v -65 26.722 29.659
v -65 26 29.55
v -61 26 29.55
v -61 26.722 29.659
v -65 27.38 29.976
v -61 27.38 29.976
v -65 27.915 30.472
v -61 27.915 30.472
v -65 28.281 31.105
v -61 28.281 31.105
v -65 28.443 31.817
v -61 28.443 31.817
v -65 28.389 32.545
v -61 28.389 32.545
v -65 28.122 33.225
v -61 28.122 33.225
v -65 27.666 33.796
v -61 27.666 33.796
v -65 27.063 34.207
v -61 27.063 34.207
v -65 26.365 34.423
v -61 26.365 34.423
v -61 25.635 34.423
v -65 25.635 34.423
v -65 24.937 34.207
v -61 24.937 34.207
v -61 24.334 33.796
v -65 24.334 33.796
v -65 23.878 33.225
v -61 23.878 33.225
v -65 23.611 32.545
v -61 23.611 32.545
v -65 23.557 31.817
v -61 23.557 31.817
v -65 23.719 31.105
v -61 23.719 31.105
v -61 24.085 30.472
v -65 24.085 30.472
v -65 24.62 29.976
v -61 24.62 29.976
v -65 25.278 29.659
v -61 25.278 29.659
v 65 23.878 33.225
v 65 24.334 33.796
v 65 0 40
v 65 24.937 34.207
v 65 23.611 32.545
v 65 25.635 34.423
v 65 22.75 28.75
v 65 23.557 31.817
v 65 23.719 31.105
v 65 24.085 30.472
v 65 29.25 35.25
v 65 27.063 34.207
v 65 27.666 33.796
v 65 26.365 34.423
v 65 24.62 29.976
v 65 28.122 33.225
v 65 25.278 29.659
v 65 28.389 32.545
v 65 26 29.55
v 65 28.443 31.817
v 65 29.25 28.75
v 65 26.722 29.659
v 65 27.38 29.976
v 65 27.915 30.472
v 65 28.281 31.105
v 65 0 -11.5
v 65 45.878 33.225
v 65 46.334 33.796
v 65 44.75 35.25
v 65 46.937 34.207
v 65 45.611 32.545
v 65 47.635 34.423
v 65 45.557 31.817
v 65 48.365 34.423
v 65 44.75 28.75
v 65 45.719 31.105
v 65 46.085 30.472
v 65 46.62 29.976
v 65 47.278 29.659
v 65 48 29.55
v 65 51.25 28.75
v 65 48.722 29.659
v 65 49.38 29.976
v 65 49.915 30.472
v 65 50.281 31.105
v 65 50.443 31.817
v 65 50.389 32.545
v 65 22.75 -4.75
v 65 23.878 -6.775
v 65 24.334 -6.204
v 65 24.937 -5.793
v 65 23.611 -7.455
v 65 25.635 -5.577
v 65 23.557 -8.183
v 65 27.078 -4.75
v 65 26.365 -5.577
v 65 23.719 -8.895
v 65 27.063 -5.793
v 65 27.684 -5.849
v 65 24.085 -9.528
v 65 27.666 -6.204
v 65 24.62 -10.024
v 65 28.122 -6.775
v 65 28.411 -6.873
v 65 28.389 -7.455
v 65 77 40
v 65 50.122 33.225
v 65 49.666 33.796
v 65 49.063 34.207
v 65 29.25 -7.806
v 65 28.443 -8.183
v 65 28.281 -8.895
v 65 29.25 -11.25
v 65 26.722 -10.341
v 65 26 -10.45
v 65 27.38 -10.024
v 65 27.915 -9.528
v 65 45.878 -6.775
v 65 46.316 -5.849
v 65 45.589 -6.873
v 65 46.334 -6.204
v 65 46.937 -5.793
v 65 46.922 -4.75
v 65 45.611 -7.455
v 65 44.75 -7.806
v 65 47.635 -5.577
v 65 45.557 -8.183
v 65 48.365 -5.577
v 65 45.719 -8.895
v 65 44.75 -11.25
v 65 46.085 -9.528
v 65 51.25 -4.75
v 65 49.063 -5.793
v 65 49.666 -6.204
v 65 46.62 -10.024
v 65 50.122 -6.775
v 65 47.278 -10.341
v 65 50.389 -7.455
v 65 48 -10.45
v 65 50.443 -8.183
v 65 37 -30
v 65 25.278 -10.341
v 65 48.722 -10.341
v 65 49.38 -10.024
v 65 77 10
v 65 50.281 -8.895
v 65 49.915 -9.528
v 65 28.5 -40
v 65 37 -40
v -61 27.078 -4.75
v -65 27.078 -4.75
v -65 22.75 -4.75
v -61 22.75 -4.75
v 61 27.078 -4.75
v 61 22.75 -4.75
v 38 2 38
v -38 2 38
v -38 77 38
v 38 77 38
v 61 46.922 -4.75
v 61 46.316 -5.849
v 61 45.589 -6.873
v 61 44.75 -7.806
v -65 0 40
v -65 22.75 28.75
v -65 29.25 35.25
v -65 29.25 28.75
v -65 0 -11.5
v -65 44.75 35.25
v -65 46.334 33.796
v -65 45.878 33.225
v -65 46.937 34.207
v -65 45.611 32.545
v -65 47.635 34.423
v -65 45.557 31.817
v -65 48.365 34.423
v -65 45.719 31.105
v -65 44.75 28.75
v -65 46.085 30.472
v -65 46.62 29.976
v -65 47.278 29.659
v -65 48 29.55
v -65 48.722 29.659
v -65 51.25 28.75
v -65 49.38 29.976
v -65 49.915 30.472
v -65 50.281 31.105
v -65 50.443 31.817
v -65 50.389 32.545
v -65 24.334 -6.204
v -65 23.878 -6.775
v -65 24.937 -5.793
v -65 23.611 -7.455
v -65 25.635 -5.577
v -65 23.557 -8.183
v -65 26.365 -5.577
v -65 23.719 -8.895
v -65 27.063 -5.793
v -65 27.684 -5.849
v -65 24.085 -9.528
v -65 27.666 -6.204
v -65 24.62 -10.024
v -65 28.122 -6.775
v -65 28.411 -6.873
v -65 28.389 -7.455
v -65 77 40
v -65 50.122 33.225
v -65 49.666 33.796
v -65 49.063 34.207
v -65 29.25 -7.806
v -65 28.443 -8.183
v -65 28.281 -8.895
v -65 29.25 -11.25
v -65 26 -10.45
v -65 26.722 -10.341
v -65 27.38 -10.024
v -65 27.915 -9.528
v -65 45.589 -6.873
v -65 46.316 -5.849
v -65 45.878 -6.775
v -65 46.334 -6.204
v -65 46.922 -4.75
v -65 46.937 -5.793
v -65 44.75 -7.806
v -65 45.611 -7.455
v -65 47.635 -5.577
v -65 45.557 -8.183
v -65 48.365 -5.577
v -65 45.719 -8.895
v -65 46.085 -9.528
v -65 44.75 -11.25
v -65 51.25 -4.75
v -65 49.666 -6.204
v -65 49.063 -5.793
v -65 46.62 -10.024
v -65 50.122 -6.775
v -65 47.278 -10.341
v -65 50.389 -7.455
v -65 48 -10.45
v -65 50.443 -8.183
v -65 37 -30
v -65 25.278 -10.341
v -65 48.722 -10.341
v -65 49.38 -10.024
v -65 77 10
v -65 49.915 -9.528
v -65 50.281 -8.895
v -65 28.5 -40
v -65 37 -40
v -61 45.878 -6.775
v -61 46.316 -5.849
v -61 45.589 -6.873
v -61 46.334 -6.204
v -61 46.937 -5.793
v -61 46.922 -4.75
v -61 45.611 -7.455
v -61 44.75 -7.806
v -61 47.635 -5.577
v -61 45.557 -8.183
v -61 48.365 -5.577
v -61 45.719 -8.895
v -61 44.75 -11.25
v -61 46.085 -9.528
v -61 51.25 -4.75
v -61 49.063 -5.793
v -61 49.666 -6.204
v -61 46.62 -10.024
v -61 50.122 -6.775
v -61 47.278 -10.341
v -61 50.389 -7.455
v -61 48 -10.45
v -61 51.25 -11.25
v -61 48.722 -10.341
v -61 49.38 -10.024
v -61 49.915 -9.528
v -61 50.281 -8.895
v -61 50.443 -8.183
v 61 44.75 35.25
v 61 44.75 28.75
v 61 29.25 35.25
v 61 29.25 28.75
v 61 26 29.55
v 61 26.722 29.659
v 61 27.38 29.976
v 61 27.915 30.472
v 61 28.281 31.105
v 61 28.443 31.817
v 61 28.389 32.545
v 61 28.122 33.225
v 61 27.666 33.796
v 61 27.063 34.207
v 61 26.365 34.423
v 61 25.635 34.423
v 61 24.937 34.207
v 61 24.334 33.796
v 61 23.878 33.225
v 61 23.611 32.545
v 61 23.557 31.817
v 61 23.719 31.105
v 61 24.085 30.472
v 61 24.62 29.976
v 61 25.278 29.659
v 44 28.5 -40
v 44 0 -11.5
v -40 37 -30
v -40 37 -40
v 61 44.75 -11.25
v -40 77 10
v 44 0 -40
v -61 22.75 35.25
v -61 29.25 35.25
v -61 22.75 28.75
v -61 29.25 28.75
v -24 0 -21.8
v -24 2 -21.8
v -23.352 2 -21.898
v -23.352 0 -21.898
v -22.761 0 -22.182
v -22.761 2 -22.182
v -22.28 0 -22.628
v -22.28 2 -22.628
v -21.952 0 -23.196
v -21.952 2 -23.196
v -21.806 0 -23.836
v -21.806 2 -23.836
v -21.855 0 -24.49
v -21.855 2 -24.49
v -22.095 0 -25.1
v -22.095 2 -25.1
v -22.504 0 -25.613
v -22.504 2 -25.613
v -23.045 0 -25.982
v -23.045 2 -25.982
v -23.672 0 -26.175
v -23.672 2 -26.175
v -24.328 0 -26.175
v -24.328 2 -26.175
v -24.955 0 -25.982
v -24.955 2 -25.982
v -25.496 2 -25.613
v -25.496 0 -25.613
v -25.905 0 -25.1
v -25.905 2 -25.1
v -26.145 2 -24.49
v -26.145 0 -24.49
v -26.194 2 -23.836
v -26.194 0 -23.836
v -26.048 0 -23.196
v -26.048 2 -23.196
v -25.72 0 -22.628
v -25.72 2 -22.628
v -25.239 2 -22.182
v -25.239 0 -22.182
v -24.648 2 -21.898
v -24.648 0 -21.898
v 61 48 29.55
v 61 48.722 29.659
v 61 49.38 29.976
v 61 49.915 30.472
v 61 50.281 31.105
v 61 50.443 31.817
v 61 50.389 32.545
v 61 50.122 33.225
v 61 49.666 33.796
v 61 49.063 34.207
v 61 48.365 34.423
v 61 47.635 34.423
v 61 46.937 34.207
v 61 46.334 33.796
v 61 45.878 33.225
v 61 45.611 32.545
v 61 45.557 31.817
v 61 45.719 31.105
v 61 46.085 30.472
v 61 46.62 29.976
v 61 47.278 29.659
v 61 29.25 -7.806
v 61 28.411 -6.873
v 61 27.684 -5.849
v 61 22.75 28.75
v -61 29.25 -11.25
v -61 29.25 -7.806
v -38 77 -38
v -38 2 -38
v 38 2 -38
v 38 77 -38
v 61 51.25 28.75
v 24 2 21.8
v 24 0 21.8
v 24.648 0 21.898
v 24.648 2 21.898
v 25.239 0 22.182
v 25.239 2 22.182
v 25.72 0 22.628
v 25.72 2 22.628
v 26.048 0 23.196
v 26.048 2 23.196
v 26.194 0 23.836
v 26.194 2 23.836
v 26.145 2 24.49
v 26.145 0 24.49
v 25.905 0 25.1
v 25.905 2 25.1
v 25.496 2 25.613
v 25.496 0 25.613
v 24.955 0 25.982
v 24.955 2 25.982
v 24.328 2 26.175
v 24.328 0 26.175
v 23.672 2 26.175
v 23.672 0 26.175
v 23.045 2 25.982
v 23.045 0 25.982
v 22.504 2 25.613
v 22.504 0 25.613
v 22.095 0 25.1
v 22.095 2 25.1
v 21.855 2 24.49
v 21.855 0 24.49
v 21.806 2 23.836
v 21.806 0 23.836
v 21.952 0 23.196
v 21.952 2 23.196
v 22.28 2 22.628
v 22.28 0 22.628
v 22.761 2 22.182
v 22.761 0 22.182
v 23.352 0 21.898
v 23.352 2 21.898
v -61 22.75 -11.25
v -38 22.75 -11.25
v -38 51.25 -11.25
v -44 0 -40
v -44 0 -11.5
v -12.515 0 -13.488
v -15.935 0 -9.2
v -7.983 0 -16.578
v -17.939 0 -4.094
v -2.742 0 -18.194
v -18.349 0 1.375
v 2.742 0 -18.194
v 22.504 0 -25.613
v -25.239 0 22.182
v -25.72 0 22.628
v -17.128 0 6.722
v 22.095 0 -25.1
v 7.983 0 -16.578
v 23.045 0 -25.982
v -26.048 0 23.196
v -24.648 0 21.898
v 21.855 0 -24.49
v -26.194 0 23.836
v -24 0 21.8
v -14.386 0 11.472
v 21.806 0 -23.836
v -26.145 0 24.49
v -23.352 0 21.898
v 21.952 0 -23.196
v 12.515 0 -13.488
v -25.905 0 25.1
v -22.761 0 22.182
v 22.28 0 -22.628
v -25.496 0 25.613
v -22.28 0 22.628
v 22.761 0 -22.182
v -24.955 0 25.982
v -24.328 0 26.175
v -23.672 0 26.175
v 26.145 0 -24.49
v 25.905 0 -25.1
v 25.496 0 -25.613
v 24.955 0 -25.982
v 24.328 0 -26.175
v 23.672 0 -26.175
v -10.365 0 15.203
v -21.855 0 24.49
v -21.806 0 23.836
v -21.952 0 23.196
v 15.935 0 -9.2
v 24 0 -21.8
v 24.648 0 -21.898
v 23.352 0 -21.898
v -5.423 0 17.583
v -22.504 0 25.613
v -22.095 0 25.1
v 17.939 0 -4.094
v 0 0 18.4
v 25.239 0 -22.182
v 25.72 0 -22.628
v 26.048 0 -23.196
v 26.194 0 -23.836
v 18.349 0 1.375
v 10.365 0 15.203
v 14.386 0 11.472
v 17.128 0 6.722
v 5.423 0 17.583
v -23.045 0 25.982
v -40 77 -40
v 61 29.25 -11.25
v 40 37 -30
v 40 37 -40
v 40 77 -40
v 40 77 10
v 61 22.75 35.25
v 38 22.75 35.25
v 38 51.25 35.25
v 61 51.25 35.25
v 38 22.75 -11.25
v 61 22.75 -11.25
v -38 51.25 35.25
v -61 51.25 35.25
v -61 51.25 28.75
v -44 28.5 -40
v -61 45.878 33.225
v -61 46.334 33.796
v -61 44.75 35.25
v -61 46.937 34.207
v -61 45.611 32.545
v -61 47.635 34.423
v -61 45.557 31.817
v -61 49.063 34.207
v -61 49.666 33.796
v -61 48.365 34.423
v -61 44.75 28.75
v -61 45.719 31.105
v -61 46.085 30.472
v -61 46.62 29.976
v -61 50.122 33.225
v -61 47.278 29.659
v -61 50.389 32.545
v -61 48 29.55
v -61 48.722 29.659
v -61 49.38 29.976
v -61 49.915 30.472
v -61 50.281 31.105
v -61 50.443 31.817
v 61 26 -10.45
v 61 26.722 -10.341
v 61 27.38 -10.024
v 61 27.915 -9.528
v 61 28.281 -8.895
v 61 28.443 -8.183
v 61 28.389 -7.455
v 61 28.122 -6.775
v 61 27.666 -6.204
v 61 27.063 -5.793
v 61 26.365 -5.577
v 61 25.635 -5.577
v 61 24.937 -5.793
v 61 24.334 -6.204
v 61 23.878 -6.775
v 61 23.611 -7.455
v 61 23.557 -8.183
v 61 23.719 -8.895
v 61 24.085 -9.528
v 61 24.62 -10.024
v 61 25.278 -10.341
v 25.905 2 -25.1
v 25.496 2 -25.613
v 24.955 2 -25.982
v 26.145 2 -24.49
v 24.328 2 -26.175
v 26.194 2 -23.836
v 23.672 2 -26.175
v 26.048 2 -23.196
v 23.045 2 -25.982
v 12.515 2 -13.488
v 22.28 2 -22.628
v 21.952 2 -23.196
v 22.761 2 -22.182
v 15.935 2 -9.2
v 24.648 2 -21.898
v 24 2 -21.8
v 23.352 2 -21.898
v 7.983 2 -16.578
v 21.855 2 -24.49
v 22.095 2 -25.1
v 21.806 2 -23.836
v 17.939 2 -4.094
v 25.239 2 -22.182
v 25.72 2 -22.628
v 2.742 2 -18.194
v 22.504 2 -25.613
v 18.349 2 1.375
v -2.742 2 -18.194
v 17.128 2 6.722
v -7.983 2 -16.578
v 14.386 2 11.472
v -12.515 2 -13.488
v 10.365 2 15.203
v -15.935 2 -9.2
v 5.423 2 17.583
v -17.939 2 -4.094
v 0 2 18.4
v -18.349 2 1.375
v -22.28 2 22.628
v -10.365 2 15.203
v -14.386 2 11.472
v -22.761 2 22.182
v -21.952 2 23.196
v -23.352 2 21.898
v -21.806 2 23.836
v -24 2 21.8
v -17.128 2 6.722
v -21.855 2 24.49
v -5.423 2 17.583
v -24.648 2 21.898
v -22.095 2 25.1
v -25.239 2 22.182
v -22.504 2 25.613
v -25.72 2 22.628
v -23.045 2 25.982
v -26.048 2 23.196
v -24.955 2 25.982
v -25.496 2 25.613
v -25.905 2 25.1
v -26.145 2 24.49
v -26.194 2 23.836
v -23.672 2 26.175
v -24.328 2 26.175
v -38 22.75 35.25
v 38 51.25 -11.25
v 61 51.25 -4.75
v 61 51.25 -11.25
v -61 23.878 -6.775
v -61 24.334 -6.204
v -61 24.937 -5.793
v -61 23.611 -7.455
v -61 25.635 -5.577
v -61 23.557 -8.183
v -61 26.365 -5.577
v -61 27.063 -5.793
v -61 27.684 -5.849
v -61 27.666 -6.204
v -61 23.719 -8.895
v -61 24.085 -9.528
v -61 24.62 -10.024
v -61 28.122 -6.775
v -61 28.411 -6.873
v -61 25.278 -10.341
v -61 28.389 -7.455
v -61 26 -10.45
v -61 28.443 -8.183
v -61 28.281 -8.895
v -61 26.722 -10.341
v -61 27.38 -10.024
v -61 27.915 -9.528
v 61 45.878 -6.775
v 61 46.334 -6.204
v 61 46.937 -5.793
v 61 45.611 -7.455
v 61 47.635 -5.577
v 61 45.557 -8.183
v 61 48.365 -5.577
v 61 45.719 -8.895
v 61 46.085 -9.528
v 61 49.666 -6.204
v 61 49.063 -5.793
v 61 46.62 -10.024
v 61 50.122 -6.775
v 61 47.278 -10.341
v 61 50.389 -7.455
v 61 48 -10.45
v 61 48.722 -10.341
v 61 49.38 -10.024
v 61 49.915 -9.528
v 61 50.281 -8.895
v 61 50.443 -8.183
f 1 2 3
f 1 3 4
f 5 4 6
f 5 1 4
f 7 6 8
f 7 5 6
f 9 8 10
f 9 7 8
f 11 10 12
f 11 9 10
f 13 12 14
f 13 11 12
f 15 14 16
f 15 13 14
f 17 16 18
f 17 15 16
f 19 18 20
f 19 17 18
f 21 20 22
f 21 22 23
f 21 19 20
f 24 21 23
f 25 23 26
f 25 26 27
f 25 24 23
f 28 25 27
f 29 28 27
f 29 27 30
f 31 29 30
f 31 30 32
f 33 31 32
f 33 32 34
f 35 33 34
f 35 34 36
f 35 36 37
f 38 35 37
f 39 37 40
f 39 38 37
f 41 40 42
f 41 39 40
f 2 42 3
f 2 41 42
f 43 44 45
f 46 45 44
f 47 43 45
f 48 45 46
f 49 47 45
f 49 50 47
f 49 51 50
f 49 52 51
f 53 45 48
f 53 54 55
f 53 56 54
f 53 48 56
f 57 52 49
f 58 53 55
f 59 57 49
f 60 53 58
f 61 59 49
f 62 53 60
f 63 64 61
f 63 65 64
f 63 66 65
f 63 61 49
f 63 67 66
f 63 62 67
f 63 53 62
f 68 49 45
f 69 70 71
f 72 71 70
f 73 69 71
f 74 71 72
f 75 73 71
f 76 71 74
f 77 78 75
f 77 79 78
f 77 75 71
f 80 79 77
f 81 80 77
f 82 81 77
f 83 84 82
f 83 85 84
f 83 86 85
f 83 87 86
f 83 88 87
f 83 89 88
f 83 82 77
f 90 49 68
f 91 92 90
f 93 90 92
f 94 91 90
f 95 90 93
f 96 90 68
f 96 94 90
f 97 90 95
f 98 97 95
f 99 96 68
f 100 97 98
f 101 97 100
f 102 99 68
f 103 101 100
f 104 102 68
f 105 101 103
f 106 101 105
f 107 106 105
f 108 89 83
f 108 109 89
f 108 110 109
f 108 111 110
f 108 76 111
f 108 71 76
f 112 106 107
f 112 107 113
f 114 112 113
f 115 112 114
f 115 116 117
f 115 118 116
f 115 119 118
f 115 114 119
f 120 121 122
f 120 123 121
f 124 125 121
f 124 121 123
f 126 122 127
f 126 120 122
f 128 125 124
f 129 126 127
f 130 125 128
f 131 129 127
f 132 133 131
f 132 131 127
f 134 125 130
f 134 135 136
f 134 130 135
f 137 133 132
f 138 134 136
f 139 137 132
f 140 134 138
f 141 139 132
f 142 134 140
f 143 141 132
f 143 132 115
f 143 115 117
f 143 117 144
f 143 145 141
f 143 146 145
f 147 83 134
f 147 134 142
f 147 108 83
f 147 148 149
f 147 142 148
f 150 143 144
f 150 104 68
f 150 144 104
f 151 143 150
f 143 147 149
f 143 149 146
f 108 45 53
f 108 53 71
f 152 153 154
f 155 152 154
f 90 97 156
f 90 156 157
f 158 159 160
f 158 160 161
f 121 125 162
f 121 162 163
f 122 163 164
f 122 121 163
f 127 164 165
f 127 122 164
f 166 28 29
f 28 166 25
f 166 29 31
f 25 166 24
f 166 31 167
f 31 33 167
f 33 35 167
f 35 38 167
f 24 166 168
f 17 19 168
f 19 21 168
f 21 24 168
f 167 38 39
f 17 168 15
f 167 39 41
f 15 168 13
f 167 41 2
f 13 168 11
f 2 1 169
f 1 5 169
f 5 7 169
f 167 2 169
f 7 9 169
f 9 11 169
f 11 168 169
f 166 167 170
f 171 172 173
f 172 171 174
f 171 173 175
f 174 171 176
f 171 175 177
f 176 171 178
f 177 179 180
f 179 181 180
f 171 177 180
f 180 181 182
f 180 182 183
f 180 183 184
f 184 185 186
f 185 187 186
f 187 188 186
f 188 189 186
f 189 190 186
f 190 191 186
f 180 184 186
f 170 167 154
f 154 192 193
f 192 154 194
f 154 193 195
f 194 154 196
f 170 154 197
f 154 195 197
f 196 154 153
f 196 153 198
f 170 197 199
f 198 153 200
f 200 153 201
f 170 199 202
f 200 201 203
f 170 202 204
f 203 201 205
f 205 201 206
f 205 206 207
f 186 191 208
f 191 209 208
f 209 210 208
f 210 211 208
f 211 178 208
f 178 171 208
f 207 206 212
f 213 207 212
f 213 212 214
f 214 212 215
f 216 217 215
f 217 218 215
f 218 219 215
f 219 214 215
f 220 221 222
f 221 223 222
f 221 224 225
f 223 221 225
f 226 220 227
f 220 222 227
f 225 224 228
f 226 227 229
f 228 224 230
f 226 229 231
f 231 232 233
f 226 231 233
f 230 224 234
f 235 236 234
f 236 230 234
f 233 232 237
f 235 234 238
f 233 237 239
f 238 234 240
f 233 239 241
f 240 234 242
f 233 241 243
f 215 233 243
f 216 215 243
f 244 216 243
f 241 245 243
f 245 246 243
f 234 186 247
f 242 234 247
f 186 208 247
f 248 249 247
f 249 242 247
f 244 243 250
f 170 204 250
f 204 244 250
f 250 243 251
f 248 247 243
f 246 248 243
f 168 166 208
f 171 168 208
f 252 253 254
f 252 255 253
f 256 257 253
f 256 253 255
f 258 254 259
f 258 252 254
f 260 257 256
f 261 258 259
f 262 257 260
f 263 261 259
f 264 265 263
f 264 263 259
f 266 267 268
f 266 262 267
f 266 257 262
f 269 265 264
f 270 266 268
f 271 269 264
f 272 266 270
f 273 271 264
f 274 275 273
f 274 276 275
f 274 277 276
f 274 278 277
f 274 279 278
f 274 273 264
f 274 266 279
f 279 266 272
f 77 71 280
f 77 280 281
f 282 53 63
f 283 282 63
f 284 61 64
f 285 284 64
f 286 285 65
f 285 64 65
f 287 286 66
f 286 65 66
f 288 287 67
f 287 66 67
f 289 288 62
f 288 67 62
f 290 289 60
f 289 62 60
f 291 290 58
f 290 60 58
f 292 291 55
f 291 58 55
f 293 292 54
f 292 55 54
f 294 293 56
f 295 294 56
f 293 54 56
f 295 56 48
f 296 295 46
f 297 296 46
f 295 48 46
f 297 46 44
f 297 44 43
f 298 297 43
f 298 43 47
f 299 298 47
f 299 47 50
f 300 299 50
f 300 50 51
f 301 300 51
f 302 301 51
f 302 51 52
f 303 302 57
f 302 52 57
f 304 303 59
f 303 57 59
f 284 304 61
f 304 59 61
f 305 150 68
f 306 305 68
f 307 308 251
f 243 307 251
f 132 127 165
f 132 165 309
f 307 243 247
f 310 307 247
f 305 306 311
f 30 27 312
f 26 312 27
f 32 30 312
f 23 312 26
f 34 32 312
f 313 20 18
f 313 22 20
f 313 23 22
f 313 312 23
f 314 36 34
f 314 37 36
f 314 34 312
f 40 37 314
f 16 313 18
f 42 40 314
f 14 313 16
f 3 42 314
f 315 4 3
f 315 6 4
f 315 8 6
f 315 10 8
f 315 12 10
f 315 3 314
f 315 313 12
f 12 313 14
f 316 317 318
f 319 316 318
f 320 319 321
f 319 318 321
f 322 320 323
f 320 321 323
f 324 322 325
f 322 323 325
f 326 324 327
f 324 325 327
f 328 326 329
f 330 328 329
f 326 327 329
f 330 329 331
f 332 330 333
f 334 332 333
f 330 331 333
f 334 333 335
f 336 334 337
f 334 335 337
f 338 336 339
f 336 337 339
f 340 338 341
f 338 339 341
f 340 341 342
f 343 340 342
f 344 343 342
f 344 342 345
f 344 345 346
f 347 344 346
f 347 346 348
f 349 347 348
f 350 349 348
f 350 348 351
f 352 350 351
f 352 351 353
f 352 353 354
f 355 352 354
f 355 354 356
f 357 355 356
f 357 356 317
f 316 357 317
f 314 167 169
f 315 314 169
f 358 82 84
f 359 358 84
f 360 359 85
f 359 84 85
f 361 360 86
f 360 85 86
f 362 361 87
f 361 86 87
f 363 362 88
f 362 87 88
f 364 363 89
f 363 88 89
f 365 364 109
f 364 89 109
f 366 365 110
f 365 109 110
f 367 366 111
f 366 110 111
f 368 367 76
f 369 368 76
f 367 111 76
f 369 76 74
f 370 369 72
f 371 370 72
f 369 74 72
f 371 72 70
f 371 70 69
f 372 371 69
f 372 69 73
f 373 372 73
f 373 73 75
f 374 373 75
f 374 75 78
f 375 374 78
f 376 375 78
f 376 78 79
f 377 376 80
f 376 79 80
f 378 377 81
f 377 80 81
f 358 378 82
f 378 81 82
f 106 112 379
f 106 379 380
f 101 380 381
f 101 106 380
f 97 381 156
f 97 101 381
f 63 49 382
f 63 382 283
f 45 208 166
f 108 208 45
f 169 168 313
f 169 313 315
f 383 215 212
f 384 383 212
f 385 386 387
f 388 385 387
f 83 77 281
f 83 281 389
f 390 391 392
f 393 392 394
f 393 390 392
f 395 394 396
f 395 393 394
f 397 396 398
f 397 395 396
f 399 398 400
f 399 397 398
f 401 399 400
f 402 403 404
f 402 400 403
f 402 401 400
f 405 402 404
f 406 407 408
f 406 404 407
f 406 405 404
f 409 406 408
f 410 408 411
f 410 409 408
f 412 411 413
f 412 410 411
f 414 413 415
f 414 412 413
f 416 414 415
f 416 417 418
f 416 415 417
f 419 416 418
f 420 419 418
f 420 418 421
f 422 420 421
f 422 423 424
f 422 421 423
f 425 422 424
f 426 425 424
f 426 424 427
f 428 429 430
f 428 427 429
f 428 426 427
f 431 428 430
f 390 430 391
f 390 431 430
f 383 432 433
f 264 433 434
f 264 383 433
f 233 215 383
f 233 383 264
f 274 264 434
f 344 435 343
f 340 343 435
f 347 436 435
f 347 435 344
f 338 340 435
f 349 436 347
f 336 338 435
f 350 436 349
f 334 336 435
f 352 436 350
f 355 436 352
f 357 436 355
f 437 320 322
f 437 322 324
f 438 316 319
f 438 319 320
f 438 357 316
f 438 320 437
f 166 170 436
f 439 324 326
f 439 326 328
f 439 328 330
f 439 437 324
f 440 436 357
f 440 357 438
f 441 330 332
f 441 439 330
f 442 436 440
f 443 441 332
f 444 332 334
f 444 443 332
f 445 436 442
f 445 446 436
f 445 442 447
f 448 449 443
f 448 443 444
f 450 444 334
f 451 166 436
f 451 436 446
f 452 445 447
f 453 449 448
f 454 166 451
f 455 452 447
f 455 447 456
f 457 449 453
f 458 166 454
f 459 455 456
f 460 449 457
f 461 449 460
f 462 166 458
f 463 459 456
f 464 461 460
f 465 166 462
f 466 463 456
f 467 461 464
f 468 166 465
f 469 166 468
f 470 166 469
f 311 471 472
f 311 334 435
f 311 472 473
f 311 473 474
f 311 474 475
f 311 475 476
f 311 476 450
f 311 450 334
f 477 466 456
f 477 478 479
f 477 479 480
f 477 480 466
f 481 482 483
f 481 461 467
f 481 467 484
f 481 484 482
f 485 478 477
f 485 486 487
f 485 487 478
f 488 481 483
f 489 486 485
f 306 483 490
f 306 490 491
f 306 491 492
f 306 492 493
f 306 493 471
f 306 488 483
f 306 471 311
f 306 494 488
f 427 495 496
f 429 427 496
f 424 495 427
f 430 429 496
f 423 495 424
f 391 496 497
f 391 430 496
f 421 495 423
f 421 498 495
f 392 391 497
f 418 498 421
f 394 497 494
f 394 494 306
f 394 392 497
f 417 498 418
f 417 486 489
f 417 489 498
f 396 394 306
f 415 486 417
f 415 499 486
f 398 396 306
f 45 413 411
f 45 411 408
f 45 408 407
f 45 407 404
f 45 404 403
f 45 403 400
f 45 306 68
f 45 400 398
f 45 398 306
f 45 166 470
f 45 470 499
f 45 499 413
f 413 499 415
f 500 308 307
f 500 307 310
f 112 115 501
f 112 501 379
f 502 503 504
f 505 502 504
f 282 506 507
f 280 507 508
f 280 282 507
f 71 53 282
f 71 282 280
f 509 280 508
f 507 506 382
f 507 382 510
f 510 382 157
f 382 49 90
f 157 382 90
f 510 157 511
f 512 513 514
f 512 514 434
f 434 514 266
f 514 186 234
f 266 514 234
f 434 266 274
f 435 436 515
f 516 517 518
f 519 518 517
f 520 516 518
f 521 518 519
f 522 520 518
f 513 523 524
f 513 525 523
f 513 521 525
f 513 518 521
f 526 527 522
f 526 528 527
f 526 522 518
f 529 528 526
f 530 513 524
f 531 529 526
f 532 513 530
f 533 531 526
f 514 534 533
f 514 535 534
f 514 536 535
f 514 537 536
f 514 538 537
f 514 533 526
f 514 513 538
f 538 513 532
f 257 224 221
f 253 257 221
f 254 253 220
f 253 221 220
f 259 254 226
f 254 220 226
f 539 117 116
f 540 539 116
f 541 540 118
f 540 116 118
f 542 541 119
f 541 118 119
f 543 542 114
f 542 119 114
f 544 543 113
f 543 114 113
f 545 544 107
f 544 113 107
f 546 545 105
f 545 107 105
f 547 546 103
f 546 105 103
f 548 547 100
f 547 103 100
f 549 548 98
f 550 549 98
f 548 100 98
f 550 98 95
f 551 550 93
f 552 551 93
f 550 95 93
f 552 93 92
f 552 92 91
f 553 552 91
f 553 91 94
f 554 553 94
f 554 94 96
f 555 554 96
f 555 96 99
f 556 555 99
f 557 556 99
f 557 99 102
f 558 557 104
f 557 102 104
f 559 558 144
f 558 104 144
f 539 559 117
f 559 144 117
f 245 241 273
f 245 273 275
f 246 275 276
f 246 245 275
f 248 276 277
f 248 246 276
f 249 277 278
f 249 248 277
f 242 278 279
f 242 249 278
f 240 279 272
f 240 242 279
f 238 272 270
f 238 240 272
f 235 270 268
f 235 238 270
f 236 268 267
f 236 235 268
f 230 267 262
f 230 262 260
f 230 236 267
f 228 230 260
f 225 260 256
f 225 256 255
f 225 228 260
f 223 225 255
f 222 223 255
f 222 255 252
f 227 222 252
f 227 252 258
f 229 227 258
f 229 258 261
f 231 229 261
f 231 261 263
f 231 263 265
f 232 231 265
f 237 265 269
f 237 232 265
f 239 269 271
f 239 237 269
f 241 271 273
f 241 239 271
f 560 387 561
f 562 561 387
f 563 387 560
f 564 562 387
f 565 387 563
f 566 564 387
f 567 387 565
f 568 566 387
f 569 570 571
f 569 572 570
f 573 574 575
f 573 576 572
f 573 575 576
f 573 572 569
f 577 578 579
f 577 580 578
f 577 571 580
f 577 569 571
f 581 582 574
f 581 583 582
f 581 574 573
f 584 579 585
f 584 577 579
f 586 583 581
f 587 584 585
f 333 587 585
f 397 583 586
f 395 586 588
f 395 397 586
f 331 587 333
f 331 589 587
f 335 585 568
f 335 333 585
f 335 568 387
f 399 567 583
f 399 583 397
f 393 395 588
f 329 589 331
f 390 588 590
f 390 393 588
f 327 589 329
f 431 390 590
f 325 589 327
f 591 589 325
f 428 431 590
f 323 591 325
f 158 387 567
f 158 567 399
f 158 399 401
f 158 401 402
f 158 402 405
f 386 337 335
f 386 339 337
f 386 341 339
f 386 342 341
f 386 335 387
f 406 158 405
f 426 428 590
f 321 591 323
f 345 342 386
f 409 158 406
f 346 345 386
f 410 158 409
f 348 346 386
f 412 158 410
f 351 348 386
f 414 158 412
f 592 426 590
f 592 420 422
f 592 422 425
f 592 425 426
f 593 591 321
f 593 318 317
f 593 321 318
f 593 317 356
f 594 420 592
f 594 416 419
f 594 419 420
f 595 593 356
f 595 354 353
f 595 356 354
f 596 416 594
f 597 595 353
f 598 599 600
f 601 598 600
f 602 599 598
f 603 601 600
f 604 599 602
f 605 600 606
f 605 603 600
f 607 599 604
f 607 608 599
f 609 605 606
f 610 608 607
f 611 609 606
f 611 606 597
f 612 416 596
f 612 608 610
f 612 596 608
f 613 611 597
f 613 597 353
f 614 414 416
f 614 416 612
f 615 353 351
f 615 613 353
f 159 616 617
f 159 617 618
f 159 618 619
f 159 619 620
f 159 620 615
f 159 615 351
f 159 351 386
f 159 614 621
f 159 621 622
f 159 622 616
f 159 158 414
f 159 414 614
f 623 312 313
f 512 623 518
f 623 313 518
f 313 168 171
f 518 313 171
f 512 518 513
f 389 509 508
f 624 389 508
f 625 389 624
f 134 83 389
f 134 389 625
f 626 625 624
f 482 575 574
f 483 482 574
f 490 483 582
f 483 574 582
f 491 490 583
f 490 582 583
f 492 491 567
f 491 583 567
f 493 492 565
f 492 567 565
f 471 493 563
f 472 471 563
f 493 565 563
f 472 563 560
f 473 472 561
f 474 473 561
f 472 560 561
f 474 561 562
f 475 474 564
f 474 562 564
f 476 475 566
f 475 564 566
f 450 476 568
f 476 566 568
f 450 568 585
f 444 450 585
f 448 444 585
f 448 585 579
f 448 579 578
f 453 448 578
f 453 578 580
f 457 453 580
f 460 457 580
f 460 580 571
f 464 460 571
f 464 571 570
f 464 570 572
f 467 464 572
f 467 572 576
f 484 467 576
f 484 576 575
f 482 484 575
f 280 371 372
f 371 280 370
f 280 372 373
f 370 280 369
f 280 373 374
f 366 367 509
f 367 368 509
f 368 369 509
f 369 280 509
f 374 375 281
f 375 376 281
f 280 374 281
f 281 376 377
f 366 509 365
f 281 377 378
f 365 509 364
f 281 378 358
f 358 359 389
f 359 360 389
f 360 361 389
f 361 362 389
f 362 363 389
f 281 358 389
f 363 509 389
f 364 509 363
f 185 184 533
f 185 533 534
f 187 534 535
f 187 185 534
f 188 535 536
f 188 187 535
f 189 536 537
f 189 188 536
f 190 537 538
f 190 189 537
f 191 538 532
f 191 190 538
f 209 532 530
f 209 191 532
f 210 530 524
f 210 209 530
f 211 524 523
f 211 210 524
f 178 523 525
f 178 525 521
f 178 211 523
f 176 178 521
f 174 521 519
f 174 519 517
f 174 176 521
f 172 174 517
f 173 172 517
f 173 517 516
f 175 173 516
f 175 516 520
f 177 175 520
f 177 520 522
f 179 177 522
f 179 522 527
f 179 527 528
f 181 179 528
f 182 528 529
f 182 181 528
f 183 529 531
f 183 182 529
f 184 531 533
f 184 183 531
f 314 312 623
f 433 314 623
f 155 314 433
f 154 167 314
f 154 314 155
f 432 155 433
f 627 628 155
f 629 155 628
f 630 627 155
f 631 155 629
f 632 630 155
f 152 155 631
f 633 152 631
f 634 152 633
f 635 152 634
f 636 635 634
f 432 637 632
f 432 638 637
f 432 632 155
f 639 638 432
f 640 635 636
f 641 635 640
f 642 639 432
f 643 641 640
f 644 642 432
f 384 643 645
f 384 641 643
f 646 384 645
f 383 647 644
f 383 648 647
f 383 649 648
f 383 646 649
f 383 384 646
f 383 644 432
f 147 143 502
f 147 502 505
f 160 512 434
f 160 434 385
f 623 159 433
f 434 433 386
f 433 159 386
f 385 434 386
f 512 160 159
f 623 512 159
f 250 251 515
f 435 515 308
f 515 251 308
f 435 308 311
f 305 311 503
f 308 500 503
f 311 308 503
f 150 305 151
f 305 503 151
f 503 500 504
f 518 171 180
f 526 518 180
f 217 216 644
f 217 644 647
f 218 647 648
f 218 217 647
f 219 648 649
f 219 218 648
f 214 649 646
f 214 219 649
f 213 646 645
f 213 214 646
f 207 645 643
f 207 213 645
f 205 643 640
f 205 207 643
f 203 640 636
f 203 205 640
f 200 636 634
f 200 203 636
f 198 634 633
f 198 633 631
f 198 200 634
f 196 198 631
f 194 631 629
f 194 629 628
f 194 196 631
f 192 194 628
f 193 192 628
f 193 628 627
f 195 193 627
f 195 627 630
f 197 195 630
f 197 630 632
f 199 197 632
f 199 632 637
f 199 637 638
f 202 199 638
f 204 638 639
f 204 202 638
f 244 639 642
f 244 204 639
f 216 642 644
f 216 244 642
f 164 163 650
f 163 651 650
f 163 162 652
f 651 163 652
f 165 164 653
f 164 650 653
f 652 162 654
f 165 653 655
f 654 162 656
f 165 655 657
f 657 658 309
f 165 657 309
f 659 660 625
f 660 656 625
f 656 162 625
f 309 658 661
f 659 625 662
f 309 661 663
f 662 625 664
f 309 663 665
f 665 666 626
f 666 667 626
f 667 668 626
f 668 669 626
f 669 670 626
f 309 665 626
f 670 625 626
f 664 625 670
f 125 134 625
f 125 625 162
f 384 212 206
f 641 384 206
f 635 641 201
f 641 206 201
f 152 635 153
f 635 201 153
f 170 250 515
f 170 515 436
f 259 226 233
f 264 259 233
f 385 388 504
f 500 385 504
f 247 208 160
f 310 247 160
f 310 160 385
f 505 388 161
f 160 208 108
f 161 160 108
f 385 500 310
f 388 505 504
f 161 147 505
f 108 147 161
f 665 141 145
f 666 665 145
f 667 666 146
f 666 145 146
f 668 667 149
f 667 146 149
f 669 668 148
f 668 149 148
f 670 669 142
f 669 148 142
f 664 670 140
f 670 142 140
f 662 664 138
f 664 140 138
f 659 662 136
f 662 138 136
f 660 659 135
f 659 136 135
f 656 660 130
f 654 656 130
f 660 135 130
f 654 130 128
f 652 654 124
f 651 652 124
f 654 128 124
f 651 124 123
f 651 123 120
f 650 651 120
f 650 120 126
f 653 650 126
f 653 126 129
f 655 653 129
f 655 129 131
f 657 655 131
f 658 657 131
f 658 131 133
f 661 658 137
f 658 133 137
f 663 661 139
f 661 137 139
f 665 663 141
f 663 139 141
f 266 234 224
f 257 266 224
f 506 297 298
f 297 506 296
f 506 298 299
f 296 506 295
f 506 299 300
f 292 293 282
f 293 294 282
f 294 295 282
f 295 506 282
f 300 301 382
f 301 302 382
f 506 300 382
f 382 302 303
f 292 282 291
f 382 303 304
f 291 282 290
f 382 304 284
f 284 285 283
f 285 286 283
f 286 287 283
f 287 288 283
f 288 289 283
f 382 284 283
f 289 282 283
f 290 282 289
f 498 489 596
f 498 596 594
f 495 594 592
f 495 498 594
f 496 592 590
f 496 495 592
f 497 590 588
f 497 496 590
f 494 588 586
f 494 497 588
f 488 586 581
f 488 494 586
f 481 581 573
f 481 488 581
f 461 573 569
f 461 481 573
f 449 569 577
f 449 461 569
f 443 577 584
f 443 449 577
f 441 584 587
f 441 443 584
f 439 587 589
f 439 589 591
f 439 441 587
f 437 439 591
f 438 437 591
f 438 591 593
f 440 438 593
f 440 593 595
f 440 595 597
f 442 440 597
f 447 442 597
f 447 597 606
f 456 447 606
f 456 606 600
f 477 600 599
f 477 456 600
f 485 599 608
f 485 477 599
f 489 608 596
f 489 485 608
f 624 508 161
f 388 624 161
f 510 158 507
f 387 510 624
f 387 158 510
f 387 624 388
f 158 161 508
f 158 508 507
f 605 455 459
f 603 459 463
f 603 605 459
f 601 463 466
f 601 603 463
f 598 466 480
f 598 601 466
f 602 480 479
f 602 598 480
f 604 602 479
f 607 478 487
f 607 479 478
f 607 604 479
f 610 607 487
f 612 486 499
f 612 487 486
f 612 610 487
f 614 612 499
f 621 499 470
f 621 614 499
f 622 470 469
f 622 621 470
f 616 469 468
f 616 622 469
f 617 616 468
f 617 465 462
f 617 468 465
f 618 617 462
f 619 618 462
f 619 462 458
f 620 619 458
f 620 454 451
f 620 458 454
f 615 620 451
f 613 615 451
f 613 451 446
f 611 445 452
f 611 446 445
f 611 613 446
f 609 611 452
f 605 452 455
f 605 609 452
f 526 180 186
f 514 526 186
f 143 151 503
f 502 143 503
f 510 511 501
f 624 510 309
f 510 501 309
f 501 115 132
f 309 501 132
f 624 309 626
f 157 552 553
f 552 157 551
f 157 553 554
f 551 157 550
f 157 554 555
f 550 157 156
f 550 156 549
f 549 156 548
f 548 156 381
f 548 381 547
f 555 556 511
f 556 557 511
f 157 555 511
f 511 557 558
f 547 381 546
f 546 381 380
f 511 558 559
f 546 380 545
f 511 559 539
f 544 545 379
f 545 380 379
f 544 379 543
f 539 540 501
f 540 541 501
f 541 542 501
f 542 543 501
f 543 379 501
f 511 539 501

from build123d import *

# Parameters (mm, degrees)
SKETCH1_W               = 80
SKETCH1_H               = 80
SKETCH1_R               = 18.4
BOSS_EXTRUDE1_DEPTH     = 2
SKETCH2_W               = 4
SKETCH2_H               = 18.5
BOSS_EXTRUDE2_DEPTH     = 15.25
SKETCH3_R               = 2.2
CUT_EXTRUDE1_DEPTH      = 94.976393312
MIRROR2_COPY_1_SKETCH_W = 4
MIRROR2_COPY_1_SKETCH_H = 18.5
MIRROR2_COPY_1_DEPTH    = 15.25
MIRROR2_COPY_2_SKETCH_R = 2.2
MIRROR2_COPY_2_DEPTH    = 94.976393312
SKETCH4_R               = 2.2
CUT_EXTRUDE2_DEPTH      = 62.388618652
SKETCH5_W               = 4
SKETCH5_H               = 15.25
CUT_EXTRUDE3_DEPTH      = 93.258129723
SKETCH6_W               = 80
SKETCH6_H               = 80
SKETCH6_W_2             = 76
SKETCH6_H_2             = 76
BOSS_EXTRUDE3_DEPTH     = 75
SKETCH7_W               = 25
SKETCH7_H               = 77
BOSS_EXTRUDE4_DEPTH     = 80
CUT_EXTRUDE5_DEPTH      = 21
SKETCH11_W              = 25
SKETCH11_H              = 40
CUT_EXTRUDE6_DEPTH      = 50
BOSS_EXTRUDE5_DEPTH     = 25
SKETCH14_W              = 46.5
SKETCH14_H              = 28.5
SKETCH14_R              = 10.25
CUT_EXTRUDE9_DEPTH      = 34
SKETCH15_W              = 6.5
SKETCH15_H              = 6.5
SKETCH15_R              = 2.45
BOSS_EXTRUDE6_DEPTH     = 4


with BuildPart() as part:
    # Sketch1 → Boss-Extrude1 (new body)
    with BuildSketch(Plane(origin=(0, 0, 0), x_dir=(1, 0, 0), z_dir=(0, 1, 0))):
        Rectangle(SKETCH1_W, SKETCH1_H)
        with Locations(Location((0, 0, 0), (0, 0, 270))):
            Circle(SKETCH1_R, mode=Mode.SUBTRACT)
    extrude(amount=BOSS_EXTRUDE1_DEPTH)

    # Sketch2 → Boss-Extrude2 (add)
    with BuildSketch(Plane(origin=(0, 2, 0), x_dir=(1, 0, 0), z_dir=(0, 1, 0))):
        with Locations((42, -30.75)):
            Rectangle(SKETCH2_W, SKETCH2_H)
    boss_extrude2 = extrude(amount=-BOSS_EXTRUDE2_DEPTH)

    # Sketch3 → Cut-Extrude1 (cut, through all)
    with BuildSketch(Plane(origin=(44, 0, 0), x_dir=(0, 0, -1), z_dir=(1, 0, 0))):
        with Locations((-30.75, -8.125)):
            Circle(SKETCH3_R)
    cut_extrude1 = extrude(amount=-CUT_EXTRUDE1_DEPTH, mode=Mode.SUBTRACT)

    # Mirror1: Boss-Extrude2, Cut-Extrude1 across plane
    add(boss_extrude2.mirror(Plane(origin=(0, 0, 0), x_dir=(0, 0, 1), z_dir=(1, 0, 0))))
    add(cut_extrude1.mirror(Plane(origin=(0, 0, 0), x_dir=(0, 0, 1), z_dir=(1, 0, 0))), mode=Mode.SUBTRACT)

    # Mirror2: Boss-Extrude2, Cut-Extrude1 across plane
    add(boss_extrude2.mirror(Plane(origin=(0, 0, 0), x_dir=(1, 0, 0), z_dir=(0, 0, -1))))
    add(cut_extrude1.mirror(Plane(origin=(0, 0, 0), x_dir=(1, 0, 0), z_dir=(0, 0, -1))), mode=Mode.SUBTRACT)

    # Mirror2 copy 1 sketch → Mirror2 copy 1 (add)
    with BuildSketch(Plane(origin=(0, 2, 0), x_dir=(-1, 0, 0), z_dir=(0, 1, 0))):
        with Locations((42, -30.75)):
            Rectangle(MIRROR2_COPY_1_SKETCH_W, MIRROR2_COPY_1_SKETCH_H)
    extrude(amount=-MIRROR2_COPY_1_DEPTH)

    # Mirror2 copy 2 sketch → Mirror2 copy 2 (cut, through all)
    with BuildSketch(Plane.ZY.offset(44)):
        with Locations((-30.75, -8.125)):
            Circle(MIRROR2_COPY_2_SKETCH_R)
    extrude(amount=-MIRROR2_COPY_2_DEPTH, mode=Mode.SUBTRACT)

    # Sketch4 → Cut-Extrude2 (cut, through all)
    with BuildSketch(Plane(origin=(0, 2, 0), x_dir=(1, 0, 0), z_dir=(0, 1, 0))):
        with Locations(Location((-24, 24, 0), (0, 0, 270))):
            Circle(SKETCH4_R)
        with Locations(Location((24, 24, 0), (0, 0, 270))):
            Circle(SKETCH4_R)
    cut_extrude2 = extrude(amount=-CUT_EXTRUDE2_DEPTH, mode=Mode.SUBTRACT)

    # Mirror3: Cut-Extrude2 across plane
    add(cut_extrude2.mirror(Plane(origin=(0, 0, 0), x_dir=(1, 0, 0), z_dir=(0, 0, -1))), mode=Mode.SUBTRACT)

    # Sketch5 → Cut-Extrude3 (cut, through all)
    with BuildSketch(Plane.XY.offset(40)):
        with Locations((-42, -5.625)):
            Rectangle(SKETCH5_W, SKETCH5_H)
        with Locations((42, -5.625)):
            Rectangle(SKETCH5_W, SKETCH5_H)
    extrude(amount=-CUT_EXTRUDE3_DEPTH, mode=Mode.SUBTRACT)

    # Sketch6 → Boss-Extrude3 (add)
    with BuildSketch(Plane(origin=(0, 2, 0), x_dir=(1, 0, 0), z_dir=(0, 1, 0))):
        Rectangle(SKETCH6_W, SKETCH6_H)
        Rectangle(SKETCH6_W_2, SKETCH6_H_2, mode=Mode.SUBTRACT)
    extrude(amount=BOSS_EXTRUDE3_DEPTH)

    # Sketch7 → Boss-Extrude4 (add)
    with BuildSketch(Plane.XY.offset(40)):
        with Locations((-52.5, 38.5)):
            Rectangle(SKETCH7_W, SKETCH7_H)
        with Locations((52.5, 38.5)):
            Rectangle(SKETCH7_W, SKETCH7_H)
    extrude(amount=-BOSS_EXTRUDE4_DEPTH)

    # Sketch9 → Cut-Extrude5 (cut)
    with BuildSketch(Plane(origin=(65, 0, 0), x_dir=(0, 0, -1), z_dir=(1, 0, 0))):
        Polygon((40, 0), (40, 28.5), (11.5, 0), align=None)
    cut_extrude5 = extrude(amount=-CUT_EXTRUDE5_DEPTH, mode=Mode.SUBTRACT)

    # Mirror4: Cut-Extrude5 across plane
    add(cut_extrude5.mirror(Plane(origin=(0, 0, 0), x_dir=(0, 0, 1), z_dir=(1, 0, 0))), mode=Mode.SUBTRACT)

    # Sketch11 → Cut-Extrude6 (cut)
    with BuildSketch(Plane(origin=(0, 0, -40), x_dir=(-1, 0, 0), z_dir=(0, 0, -1))):
        with Locations((-52.5, 57)):
            Rectangle(SKETCH11_W, SKETCH11_H)
        with Locations((52.5, 57)):
            Rectangle(SKETCH11_W, SKETCH11_H)
    extrude(amount=-CUT_EXTRUDE6_DEPTH, mode=Mode.SUBTRACT)

    # Sketch12 → Boss-Extrude5 (add)
    with BuildSketch(Plane(origin=(65, 0, 0), x_dir=(0, 0, -1), z_dir=(1, 0, 0))):
        Polygon((30, 37), (-10, 77), (-10, 37), align=None)
    boss_extrude5 = extrude(amount=-BOSS_EXTRUDE5_DEPTH)

    # Mirror5: Boss-Extrude5 across plane
    add(boss_extrude5.mirror(Plane(origin=(0, 0, 0), x_dir=(0, 0, 1), z_dir=(1, 0, 0))))

    # Sketch14 → Cut-Extrude9 (cut)
    # profile 1 of 2: a face of its own
    with BuildSketch(Plane(origin=(65, 0, 0), x_dir=(0, 0, -1), z_dir=(1, 0, 0))):
        with Locations((-12, 37)):
            Rectangle(SKETCH14_W, SKETCH14_H)
        with Locations((0, 37)):
            Circle(SKETCH14_R, mode=Mode.SUBTRACT)
    # profile 2 of 2: a face of its own
    with BuildSketch(Plane(origin=(65, 0, 0), x_dir=(0, 0, -1), z_dir=(1, 0, 0))):
        with Locations((0, 37)):
            Circle(SKETCH14_R)
    cut_extrude9 = extrude(amount=-CUT_EXTRUDE9_DEPTH, mode=Mode.SUBTRACT)

    # Mirror6: Cut-Extrude9 across plane
    add(cut_extrude9.mirror(Plane(origin=(0, 0, 0), x_dir=(0, 0, 1), z_dir=(1, 0, 0))), mode=Mode.SUBTRACT)

    # Sketch15 → Boss-Extrude6 (add)
    # profile 1 of 4: a face of its own
    with BuildSketch(Plane(origin=(65, 0, 0), x_dir=(0, 0, -1), z_dir=(1, 0, 0))):
        with Locations((-32, 48)):
            Rectangle(SKETCH15_W, SKETCH15_H)
        with Locations((-32, 48)):
            Circle(SKETCH15_R, mode=Mode.SUBTRACT)
    # profile 2 of 4: a face of its own
    with BuildSketch(Plane(origin=(65, 0, 0), x_dir=(0, 0, -1), z_dir=(1, 0, 0))):
        with Locations((-32, 26)):
            Rectangle(SKETCH15_W, SKETCH15_H)
        with Locations((-32, 26)):
            Circle(SKETCH15_R, mode=Mode.SUBTRACT)
    # profile 3 of 4: a face of its own
    with BuildSketch(Plane(origin=(65, 0, 0), x_dir=(0, 0, -1), z_dir=(1, 0, 0))):
        with BuildLine():
            ThreePointArc((7.806247498, 29.25), (6.371323573, 28.033047567), (4.75, 27.078432584))
            Line((4.75, 27.078432584), (4.75, 22.75))
            Line((4.75, 22.75), (11.25, 22.75))
            Line((11.25, 22.75), (11.25, 29.25))
            Line((11.25, 29.25), (7.806247498, 29.25))
        make_face()
        with Locations((8, 26)):
            Circle(SKETCH15_R, mode=Mode.SUBTRACT)
    # profile 4 of 4: a face of its own
    with BuildSketch(Plane(origin=(65, 0, 0), x_dir=(0, 0, -1), z_dir=(1, 0, 0))):
        with BuildLine():
            Line((11.25, 51.25), (4.75, 51.25))
            Line((4.75, 51.25), (4.75, 46.921567416))
            ThreePointArc((4.75, 46.921567416), (6.371323573, 45.966952433), (7.806247498, 44.75))
            Line((7.806247498, 44.75), (11.25, 44.75))
            Line((11.25, 44.75), (11.25, 51.25))
        make_face()
        with Locations((8, 48)):
            Circle(SKETCH15_R, mode=Mode.SUBTRACT)
    boss_extrude6 = extrude(amount=-BOSS_EXTRUDE6_DEPTH)

    # Mirror7: Boss-Extrude6 across plane
    add(boss_extrude6.mirror(Plane(origin=(0, 0, 0), x_dir=(0, 0, 1), z_dir=(1, 0, 0))))


solid = part.part
